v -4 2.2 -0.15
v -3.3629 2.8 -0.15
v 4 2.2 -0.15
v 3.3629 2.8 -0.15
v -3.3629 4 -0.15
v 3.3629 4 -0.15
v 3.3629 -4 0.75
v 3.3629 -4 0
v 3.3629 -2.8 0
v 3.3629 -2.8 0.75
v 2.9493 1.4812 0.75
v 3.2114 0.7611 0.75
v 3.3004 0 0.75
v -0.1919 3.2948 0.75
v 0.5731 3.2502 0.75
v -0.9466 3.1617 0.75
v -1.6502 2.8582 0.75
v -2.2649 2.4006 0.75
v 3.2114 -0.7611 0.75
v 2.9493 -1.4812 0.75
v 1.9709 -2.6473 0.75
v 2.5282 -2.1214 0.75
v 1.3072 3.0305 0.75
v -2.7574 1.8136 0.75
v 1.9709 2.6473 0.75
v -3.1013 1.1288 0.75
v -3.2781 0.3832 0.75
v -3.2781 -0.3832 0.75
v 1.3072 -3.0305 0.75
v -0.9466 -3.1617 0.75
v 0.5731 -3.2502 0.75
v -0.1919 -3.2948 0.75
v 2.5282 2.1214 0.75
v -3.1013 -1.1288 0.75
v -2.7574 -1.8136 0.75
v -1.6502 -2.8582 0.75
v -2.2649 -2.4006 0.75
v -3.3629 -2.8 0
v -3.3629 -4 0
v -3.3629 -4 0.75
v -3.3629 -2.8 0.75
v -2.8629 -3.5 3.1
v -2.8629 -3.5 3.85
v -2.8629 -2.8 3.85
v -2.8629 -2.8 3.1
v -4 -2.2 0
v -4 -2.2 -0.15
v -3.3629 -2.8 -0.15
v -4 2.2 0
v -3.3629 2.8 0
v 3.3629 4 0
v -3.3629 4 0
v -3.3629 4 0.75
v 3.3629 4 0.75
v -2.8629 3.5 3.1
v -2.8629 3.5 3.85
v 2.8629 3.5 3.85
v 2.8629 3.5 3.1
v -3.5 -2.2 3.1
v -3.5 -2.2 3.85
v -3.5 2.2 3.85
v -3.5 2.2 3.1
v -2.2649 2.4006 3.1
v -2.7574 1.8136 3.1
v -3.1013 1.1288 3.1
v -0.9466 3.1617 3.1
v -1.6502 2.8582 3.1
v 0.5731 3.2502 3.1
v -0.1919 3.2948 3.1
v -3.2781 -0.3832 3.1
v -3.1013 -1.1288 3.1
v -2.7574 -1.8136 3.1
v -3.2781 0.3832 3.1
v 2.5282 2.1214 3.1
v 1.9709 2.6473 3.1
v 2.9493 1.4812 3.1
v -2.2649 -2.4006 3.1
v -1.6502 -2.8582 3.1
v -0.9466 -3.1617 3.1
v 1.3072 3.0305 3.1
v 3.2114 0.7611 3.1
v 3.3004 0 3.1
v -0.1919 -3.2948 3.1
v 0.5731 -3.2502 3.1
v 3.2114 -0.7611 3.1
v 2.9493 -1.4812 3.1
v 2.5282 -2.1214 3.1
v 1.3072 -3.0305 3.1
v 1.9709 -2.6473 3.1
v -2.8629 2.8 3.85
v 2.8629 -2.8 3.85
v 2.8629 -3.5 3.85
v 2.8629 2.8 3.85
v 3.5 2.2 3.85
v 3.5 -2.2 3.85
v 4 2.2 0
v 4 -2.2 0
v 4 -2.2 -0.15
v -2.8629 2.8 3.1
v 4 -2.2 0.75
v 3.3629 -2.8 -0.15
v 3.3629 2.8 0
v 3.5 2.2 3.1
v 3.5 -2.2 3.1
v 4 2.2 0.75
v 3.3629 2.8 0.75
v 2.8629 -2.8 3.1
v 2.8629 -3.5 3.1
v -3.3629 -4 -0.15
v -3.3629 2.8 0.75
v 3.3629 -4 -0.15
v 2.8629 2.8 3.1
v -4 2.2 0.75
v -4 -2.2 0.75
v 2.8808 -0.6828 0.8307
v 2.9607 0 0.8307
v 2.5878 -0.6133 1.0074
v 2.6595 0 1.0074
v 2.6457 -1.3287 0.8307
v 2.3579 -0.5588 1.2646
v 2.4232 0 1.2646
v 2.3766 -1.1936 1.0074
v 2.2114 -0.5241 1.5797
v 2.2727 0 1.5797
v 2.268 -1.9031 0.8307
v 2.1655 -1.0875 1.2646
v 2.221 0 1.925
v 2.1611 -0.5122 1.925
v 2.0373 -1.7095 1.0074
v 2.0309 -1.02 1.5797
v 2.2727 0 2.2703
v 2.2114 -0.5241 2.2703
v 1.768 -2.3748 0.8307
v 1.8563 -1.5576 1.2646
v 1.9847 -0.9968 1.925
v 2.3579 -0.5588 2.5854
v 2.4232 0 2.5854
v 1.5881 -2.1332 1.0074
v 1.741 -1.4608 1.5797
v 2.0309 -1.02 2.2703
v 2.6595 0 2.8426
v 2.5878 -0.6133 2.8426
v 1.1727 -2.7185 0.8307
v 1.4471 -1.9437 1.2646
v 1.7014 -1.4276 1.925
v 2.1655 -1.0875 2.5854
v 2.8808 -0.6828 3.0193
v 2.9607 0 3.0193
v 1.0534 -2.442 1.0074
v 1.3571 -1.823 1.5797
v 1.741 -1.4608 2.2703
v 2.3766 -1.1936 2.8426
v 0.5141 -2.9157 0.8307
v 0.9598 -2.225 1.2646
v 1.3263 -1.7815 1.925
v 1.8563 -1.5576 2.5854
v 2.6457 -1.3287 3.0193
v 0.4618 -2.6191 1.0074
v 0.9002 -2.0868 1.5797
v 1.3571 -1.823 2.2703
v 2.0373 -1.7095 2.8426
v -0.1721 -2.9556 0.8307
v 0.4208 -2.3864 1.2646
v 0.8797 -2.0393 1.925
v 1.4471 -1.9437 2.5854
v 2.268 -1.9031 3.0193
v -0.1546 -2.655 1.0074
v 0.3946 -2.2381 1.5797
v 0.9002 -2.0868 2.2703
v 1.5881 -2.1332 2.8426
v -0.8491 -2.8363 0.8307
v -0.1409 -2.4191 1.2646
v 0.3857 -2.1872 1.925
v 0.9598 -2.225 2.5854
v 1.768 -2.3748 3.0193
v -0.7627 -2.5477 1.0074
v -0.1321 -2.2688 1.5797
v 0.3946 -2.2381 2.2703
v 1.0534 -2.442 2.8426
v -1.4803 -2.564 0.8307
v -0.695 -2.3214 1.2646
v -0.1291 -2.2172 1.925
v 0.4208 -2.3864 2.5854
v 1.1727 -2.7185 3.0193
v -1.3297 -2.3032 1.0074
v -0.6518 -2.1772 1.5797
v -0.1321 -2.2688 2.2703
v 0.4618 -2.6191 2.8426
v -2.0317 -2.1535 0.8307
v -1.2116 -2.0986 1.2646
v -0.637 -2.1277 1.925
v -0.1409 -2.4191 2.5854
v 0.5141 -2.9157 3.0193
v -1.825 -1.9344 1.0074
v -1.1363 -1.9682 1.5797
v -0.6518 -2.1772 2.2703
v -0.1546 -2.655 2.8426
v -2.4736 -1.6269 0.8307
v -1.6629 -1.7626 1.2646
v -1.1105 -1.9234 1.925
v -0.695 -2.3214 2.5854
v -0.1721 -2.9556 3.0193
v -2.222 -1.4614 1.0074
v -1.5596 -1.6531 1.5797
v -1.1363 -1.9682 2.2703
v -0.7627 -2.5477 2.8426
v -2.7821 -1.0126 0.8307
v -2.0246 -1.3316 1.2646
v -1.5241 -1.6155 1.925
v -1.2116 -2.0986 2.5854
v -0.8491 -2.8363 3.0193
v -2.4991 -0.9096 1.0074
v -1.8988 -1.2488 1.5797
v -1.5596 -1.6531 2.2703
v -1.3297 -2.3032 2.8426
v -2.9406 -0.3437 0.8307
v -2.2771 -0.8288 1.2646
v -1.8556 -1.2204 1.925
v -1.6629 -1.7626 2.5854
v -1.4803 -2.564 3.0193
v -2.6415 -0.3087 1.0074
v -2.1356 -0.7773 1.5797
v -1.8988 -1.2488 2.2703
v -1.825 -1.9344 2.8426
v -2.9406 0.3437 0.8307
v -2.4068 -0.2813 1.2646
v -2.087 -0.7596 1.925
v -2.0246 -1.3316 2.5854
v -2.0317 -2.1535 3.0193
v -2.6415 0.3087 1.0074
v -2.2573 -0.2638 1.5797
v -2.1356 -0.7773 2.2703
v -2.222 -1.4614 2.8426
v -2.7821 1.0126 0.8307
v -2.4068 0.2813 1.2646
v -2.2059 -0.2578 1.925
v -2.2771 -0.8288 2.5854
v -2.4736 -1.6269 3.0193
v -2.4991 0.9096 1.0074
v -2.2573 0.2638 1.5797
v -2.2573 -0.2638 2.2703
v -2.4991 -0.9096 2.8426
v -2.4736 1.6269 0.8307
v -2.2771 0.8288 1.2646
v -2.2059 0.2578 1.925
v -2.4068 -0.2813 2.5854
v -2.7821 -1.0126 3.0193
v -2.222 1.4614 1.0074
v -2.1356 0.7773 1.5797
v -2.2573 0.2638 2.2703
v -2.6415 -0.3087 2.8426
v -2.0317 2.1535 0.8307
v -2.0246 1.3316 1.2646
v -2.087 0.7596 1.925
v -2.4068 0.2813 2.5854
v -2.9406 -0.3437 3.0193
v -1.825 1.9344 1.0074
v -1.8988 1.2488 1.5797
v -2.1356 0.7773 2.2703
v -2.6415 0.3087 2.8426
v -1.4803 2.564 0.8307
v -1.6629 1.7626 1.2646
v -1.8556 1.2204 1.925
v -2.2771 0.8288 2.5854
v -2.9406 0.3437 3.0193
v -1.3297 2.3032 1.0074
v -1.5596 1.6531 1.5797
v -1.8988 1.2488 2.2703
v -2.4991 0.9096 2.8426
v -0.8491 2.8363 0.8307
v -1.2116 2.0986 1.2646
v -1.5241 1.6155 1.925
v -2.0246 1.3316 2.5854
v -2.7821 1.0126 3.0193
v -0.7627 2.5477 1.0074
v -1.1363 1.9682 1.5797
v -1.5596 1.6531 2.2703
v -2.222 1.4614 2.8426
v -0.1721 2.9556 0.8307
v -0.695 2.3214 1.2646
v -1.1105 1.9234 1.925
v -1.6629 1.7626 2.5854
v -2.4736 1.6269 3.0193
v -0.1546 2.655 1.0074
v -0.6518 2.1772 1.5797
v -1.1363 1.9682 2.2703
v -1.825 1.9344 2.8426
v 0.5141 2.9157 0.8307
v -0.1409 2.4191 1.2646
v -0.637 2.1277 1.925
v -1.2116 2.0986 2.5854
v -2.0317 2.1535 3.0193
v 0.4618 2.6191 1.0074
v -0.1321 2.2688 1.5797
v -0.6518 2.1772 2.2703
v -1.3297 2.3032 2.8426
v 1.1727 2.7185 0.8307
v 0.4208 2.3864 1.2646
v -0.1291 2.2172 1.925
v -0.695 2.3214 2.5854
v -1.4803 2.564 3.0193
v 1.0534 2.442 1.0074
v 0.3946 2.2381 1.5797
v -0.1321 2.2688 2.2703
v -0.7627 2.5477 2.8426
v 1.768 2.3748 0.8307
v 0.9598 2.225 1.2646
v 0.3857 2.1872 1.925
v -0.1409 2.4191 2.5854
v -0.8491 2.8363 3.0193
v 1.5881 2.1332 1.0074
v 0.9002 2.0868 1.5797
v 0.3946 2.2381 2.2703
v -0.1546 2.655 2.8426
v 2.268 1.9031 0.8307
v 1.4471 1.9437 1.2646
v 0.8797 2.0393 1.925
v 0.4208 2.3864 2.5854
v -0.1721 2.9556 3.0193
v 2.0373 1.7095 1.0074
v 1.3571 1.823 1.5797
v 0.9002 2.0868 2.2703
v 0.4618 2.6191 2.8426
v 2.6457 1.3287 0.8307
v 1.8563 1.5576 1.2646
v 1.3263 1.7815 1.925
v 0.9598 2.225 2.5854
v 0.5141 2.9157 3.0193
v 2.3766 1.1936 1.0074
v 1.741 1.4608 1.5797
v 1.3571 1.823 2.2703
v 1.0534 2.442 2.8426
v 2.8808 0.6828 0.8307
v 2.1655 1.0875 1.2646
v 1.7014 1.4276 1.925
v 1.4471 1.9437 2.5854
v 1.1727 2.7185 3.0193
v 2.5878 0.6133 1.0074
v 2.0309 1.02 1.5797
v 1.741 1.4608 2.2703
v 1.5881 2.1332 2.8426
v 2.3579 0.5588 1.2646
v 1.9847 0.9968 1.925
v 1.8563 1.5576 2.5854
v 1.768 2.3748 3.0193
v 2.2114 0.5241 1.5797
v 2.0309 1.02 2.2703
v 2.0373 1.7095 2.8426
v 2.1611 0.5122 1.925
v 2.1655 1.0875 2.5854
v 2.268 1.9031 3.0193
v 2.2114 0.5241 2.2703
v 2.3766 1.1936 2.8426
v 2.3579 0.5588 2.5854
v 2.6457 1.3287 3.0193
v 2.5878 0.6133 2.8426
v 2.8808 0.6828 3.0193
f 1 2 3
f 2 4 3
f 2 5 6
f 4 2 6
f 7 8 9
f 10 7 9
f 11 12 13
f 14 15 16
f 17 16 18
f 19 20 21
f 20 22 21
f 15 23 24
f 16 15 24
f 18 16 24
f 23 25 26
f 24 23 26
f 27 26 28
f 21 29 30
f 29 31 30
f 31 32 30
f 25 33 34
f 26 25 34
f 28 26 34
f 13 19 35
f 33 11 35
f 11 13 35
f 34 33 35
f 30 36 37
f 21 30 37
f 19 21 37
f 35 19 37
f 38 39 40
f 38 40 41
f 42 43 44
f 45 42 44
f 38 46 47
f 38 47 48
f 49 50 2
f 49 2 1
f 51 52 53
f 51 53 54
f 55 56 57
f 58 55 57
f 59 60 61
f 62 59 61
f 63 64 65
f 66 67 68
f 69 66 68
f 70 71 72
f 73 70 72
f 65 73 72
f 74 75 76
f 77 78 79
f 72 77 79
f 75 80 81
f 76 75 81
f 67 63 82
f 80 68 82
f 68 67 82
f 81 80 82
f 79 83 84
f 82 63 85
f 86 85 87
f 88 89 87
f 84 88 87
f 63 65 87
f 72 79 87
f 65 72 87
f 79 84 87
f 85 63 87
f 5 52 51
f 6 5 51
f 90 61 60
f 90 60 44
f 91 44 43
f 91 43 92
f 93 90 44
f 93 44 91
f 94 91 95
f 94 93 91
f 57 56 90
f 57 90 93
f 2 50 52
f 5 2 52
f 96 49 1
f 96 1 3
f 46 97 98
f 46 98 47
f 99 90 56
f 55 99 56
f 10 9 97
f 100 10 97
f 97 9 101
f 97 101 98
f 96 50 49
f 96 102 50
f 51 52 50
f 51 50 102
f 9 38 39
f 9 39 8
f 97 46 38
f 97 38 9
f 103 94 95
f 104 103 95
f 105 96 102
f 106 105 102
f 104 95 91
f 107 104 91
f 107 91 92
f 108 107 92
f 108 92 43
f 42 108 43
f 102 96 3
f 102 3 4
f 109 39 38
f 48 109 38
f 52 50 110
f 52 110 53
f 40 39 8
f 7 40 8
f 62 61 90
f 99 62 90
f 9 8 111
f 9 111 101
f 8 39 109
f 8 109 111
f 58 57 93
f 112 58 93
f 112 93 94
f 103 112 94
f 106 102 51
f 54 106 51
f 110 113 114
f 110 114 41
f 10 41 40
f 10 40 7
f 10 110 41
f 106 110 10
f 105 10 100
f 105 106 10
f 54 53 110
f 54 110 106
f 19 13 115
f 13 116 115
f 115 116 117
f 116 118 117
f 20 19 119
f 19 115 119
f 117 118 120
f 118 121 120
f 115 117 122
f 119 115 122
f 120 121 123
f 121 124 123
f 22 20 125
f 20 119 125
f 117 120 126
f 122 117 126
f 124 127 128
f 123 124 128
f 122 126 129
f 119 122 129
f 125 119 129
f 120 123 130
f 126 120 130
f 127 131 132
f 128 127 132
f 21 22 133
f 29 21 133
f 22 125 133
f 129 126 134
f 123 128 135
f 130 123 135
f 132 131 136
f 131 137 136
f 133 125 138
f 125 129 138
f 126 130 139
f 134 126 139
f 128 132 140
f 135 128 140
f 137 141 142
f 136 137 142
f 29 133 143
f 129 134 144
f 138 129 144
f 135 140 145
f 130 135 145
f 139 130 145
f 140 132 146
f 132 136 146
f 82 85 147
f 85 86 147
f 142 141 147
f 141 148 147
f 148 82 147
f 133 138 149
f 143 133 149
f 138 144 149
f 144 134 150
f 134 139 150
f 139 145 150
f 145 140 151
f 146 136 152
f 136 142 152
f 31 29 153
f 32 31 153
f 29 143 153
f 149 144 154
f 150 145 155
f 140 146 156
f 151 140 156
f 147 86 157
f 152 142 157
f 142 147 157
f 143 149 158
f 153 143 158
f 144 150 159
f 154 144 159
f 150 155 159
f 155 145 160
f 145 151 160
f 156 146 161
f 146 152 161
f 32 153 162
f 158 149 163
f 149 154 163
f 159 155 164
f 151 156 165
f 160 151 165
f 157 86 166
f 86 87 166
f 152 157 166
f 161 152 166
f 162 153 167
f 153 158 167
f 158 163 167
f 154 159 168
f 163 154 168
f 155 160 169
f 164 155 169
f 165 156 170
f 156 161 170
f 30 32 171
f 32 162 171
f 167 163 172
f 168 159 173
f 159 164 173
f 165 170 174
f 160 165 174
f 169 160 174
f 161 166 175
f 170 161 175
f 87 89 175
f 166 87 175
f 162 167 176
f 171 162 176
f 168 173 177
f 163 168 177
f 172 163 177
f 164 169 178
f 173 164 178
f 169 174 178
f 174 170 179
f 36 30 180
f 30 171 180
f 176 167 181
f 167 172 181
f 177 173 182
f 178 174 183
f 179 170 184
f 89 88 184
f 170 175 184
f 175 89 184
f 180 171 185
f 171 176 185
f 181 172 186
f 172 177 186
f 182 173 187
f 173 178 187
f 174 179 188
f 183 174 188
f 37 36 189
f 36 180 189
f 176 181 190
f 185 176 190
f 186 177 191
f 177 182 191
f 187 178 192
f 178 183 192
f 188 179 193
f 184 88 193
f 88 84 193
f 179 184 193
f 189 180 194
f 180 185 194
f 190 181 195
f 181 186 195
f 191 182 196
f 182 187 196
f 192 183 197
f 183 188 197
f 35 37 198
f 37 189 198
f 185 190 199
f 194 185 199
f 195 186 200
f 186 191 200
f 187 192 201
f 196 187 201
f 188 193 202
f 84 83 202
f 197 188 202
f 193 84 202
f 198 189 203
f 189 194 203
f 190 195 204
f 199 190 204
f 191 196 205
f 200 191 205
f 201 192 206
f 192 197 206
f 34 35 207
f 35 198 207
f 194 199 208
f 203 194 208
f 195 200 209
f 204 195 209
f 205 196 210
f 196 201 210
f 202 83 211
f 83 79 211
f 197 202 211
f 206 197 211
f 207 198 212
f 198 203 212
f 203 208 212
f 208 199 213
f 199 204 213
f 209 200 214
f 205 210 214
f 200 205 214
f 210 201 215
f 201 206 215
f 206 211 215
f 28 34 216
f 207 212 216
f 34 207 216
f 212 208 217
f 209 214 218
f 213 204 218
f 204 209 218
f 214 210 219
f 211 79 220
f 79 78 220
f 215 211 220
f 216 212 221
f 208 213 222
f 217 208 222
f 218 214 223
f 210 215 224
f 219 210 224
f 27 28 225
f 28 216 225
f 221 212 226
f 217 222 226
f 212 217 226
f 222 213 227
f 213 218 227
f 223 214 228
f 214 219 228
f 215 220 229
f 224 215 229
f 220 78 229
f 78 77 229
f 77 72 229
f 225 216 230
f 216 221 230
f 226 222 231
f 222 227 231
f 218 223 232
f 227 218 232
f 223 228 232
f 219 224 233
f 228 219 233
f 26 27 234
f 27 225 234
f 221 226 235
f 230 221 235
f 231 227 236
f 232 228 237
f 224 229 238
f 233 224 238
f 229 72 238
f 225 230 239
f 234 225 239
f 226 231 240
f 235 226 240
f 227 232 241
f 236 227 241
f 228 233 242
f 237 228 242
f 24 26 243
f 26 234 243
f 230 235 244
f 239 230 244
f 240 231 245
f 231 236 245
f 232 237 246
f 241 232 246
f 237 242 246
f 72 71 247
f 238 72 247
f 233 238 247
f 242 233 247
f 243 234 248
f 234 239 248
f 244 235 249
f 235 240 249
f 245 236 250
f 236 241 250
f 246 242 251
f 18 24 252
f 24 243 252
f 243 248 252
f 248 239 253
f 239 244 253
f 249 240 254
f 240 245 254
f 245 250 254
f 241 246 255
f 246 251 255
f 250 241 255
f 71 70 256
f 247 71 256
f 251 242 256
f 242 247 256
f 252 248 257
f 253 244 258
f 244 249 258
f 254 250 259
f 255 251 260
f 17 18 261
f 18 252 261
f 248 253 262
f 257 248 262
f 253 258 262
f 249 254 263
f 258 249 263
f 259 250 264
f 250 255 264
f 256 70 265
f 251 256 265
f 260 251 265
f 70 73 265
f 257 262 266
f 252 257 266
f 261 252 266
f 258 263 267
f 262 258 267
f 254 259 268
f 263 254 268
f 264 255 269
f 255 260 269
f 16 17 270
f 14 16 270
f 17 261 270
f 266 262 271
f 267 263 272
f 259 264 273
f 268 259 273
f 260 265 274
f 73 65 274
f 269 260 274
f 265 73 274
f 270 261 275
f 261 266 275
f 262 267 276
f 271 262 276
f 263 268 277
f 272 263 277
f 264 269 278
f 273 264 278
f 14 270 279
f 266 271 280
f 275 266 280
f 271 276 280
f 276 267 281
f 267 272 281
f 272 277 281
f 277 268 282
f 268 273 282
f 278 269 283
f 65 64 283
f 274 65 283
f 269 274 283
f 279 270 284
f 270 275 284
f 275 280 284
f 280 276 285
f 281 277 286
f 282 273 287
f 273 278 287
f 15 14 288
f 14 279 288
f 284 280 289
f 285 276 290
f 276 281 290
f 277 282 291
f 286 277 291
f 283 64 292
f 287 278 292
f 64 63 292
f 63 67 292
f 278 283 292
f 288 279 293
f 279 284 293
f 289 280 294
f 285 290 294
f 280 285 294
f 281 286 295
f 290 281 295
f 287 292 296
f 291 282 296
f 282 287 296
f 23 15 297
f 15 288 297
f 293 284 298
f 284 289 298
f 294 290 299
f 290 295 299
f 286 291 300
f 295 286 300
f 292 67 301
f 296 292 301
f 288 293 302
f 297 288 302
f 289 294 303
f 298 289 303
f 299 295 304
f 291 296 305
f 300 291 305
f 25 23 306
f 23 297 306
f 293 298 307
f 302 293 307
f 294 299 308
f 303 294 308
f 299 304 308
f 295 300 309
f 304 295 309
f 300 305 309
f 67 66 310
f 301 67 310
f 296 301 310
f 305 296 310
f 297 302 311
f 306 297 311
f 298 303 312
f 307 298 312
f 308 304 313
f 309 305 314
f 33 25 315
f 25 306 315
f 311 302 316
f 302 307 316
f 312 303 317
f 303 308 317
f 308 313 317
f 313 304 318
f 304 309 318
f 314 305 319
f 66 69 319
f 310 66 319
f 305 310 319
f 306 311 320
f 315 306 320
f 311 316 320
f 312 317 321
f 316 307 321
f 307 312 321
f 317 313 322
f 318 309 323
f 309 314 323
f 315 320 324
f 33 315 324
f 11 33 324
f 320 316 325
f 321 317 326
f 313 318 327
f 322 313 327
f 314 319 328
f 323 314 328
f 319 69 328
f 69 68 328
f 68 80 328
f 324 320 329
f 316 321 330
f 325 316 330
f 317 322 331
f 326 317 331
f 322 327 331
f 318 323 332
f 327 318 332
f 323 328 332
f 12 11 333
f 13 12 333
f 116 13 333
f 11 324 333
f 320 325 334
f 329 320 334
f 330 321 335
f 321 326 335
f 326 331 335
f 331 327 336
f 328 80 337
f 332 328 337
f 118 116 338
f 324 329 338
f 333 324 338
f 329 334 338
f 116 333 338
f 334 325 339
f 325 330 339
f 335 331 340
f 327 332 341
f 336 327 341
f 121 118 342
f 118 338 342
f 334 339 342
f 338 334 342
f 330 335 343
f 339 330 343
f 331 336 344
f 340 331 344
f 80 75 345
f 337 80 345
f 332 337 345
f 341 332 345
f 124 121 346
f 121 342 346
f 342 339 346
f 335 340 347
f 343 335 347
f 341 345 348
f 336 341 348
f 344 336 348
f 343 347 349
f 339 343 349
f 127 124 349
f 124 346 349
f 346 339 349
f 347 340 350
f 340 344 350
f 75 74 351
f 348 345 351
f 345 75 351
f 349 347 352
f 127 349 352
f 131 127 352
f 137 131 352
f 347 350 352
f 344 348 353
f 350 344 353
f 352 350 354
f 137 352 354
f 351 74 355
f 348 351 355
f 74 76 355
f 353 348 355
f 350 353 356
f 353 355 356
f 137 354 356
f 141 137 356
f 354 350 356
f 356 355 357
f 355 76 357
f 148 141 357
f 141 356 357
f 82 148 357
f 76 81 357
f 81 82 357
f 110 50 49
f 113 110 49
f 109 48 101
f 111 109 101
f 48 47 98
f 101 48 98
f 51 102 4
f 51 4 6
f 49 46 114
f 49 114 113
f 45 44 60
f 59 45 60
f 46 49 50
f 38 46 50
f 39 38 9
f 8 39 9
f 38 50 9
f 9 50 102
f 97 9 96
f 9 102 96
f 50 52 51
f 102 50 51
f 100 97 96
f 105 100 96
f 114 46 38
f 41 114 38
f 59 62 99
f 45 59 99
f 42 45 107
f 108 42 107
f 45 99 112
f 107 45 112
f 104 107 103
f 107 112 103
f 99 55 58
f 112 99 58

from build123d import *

# Parameters (mm, degrees)
F0_W     = 6.72587
F0_H     = 1.2
F0_W_2   = 8
F0_H_2   = 4.4
F1_DEPTH = 0.75
F6_DEPTH = 0.75
F7_DEPTH = 0.15


with BuildPart() as f1:
    # F0 (on Top) → F1 (new body)
    with BuildSketch(Plane.XY):
        with Locations((0, 3.4)):
            Rectangle(F0_W, F0_H)
        Polygon((3.362935, 2.8), (-3.362935, 2.8), (-4, 2.2), (4, 2.2), align=None)
        Rectangle(F0_W_2, F0_H_2)
        Polygon((4, -2.2), (-4, -2.2), (-3.362935, -2.8), (3.362935, -2.8), align=None)
        with Locations((0, -3.4)):
            Rectangle(F0_W, F0_H)
    extrude(amount=F1_DEPTH)


with BuildPart() as f2_1:
    # F2: copy of F1
    add(f1.part.moved(Location((0, 0, 3.1))))

    # F5 (on face) → F6 (cut)
    with BuildSketch(Plane.XY.offset(3.85)):
        Polygon((-2.862935, 4), (-3.362935, 4), (-3.362935, 2.8), (-4, 2.2), (-4, -2.2), (-3.362935, -2.8), (-3.362935, -4), (3.362935, -4), (3.362935, -2.8), (4, -2.2), (4, 2.2), (3.362935, 2.8), (3.362935, 4), align=None)
        Polygon((-2.862935, 2.8), (-2.862935, 3.5), (0, 3.5), (2.862935, 3.5), (2.862935, 2.8), (3.5, 2.2), (3.5, -2.2), (2.862935, -2.8), (2.862935, -3.499964), (0, -3.499964), (-2.862935, -3.499964), (-2.862935, -2.8), (-3.5, -2.2), (-3.5, 2.2), align=None, mode=Mode.SUBTRACT)
    extrude(amount=-F6_DEPTH, mode=Mode.SUBTRACT)


with BuildPart() as f4:
    # F3 (on Front) → F4 (revolve)
    with BuildSketch(Plane.XZ):
        with BuildLine():
            Line((0, 0.75), (3.300383, 0.75))
            ThreePointArc((3.300383, 0.75), (2.22096, 1.925), (3.300383, 3.1))
            Line((3.300383, 3.1), (0, 3.1))
            Line((0, 3.1), (0, 0.75))
        make_face()
    revolve(axis=Axis((0, 0, 1.925), (0, 0, -1)))


with BuildPart() as f7:
    # F0 (on Top) → F7 (new body)
    with BuildSketch(Plane.XY):
        with Locations((0, -3.4)):
            Rectangle(F0_W, F0_H)
        Polygon((4, -2.2), (-4, -2.2), (-3.362935, -2.8), (3.362935, -2.8), align=None)
        Polygon((3.362935, 2.8), (-3.362935, 2.8), (-4, 2.2), (4, 2.2), align=None)
        with Locations((0, 3.4)):
            Rectangle(F0_W, F0_H)
    extrude(amount=-F7_DEPTH)


solid = Compound([f1.part, f2_1.part, f4.part, f7.part])
